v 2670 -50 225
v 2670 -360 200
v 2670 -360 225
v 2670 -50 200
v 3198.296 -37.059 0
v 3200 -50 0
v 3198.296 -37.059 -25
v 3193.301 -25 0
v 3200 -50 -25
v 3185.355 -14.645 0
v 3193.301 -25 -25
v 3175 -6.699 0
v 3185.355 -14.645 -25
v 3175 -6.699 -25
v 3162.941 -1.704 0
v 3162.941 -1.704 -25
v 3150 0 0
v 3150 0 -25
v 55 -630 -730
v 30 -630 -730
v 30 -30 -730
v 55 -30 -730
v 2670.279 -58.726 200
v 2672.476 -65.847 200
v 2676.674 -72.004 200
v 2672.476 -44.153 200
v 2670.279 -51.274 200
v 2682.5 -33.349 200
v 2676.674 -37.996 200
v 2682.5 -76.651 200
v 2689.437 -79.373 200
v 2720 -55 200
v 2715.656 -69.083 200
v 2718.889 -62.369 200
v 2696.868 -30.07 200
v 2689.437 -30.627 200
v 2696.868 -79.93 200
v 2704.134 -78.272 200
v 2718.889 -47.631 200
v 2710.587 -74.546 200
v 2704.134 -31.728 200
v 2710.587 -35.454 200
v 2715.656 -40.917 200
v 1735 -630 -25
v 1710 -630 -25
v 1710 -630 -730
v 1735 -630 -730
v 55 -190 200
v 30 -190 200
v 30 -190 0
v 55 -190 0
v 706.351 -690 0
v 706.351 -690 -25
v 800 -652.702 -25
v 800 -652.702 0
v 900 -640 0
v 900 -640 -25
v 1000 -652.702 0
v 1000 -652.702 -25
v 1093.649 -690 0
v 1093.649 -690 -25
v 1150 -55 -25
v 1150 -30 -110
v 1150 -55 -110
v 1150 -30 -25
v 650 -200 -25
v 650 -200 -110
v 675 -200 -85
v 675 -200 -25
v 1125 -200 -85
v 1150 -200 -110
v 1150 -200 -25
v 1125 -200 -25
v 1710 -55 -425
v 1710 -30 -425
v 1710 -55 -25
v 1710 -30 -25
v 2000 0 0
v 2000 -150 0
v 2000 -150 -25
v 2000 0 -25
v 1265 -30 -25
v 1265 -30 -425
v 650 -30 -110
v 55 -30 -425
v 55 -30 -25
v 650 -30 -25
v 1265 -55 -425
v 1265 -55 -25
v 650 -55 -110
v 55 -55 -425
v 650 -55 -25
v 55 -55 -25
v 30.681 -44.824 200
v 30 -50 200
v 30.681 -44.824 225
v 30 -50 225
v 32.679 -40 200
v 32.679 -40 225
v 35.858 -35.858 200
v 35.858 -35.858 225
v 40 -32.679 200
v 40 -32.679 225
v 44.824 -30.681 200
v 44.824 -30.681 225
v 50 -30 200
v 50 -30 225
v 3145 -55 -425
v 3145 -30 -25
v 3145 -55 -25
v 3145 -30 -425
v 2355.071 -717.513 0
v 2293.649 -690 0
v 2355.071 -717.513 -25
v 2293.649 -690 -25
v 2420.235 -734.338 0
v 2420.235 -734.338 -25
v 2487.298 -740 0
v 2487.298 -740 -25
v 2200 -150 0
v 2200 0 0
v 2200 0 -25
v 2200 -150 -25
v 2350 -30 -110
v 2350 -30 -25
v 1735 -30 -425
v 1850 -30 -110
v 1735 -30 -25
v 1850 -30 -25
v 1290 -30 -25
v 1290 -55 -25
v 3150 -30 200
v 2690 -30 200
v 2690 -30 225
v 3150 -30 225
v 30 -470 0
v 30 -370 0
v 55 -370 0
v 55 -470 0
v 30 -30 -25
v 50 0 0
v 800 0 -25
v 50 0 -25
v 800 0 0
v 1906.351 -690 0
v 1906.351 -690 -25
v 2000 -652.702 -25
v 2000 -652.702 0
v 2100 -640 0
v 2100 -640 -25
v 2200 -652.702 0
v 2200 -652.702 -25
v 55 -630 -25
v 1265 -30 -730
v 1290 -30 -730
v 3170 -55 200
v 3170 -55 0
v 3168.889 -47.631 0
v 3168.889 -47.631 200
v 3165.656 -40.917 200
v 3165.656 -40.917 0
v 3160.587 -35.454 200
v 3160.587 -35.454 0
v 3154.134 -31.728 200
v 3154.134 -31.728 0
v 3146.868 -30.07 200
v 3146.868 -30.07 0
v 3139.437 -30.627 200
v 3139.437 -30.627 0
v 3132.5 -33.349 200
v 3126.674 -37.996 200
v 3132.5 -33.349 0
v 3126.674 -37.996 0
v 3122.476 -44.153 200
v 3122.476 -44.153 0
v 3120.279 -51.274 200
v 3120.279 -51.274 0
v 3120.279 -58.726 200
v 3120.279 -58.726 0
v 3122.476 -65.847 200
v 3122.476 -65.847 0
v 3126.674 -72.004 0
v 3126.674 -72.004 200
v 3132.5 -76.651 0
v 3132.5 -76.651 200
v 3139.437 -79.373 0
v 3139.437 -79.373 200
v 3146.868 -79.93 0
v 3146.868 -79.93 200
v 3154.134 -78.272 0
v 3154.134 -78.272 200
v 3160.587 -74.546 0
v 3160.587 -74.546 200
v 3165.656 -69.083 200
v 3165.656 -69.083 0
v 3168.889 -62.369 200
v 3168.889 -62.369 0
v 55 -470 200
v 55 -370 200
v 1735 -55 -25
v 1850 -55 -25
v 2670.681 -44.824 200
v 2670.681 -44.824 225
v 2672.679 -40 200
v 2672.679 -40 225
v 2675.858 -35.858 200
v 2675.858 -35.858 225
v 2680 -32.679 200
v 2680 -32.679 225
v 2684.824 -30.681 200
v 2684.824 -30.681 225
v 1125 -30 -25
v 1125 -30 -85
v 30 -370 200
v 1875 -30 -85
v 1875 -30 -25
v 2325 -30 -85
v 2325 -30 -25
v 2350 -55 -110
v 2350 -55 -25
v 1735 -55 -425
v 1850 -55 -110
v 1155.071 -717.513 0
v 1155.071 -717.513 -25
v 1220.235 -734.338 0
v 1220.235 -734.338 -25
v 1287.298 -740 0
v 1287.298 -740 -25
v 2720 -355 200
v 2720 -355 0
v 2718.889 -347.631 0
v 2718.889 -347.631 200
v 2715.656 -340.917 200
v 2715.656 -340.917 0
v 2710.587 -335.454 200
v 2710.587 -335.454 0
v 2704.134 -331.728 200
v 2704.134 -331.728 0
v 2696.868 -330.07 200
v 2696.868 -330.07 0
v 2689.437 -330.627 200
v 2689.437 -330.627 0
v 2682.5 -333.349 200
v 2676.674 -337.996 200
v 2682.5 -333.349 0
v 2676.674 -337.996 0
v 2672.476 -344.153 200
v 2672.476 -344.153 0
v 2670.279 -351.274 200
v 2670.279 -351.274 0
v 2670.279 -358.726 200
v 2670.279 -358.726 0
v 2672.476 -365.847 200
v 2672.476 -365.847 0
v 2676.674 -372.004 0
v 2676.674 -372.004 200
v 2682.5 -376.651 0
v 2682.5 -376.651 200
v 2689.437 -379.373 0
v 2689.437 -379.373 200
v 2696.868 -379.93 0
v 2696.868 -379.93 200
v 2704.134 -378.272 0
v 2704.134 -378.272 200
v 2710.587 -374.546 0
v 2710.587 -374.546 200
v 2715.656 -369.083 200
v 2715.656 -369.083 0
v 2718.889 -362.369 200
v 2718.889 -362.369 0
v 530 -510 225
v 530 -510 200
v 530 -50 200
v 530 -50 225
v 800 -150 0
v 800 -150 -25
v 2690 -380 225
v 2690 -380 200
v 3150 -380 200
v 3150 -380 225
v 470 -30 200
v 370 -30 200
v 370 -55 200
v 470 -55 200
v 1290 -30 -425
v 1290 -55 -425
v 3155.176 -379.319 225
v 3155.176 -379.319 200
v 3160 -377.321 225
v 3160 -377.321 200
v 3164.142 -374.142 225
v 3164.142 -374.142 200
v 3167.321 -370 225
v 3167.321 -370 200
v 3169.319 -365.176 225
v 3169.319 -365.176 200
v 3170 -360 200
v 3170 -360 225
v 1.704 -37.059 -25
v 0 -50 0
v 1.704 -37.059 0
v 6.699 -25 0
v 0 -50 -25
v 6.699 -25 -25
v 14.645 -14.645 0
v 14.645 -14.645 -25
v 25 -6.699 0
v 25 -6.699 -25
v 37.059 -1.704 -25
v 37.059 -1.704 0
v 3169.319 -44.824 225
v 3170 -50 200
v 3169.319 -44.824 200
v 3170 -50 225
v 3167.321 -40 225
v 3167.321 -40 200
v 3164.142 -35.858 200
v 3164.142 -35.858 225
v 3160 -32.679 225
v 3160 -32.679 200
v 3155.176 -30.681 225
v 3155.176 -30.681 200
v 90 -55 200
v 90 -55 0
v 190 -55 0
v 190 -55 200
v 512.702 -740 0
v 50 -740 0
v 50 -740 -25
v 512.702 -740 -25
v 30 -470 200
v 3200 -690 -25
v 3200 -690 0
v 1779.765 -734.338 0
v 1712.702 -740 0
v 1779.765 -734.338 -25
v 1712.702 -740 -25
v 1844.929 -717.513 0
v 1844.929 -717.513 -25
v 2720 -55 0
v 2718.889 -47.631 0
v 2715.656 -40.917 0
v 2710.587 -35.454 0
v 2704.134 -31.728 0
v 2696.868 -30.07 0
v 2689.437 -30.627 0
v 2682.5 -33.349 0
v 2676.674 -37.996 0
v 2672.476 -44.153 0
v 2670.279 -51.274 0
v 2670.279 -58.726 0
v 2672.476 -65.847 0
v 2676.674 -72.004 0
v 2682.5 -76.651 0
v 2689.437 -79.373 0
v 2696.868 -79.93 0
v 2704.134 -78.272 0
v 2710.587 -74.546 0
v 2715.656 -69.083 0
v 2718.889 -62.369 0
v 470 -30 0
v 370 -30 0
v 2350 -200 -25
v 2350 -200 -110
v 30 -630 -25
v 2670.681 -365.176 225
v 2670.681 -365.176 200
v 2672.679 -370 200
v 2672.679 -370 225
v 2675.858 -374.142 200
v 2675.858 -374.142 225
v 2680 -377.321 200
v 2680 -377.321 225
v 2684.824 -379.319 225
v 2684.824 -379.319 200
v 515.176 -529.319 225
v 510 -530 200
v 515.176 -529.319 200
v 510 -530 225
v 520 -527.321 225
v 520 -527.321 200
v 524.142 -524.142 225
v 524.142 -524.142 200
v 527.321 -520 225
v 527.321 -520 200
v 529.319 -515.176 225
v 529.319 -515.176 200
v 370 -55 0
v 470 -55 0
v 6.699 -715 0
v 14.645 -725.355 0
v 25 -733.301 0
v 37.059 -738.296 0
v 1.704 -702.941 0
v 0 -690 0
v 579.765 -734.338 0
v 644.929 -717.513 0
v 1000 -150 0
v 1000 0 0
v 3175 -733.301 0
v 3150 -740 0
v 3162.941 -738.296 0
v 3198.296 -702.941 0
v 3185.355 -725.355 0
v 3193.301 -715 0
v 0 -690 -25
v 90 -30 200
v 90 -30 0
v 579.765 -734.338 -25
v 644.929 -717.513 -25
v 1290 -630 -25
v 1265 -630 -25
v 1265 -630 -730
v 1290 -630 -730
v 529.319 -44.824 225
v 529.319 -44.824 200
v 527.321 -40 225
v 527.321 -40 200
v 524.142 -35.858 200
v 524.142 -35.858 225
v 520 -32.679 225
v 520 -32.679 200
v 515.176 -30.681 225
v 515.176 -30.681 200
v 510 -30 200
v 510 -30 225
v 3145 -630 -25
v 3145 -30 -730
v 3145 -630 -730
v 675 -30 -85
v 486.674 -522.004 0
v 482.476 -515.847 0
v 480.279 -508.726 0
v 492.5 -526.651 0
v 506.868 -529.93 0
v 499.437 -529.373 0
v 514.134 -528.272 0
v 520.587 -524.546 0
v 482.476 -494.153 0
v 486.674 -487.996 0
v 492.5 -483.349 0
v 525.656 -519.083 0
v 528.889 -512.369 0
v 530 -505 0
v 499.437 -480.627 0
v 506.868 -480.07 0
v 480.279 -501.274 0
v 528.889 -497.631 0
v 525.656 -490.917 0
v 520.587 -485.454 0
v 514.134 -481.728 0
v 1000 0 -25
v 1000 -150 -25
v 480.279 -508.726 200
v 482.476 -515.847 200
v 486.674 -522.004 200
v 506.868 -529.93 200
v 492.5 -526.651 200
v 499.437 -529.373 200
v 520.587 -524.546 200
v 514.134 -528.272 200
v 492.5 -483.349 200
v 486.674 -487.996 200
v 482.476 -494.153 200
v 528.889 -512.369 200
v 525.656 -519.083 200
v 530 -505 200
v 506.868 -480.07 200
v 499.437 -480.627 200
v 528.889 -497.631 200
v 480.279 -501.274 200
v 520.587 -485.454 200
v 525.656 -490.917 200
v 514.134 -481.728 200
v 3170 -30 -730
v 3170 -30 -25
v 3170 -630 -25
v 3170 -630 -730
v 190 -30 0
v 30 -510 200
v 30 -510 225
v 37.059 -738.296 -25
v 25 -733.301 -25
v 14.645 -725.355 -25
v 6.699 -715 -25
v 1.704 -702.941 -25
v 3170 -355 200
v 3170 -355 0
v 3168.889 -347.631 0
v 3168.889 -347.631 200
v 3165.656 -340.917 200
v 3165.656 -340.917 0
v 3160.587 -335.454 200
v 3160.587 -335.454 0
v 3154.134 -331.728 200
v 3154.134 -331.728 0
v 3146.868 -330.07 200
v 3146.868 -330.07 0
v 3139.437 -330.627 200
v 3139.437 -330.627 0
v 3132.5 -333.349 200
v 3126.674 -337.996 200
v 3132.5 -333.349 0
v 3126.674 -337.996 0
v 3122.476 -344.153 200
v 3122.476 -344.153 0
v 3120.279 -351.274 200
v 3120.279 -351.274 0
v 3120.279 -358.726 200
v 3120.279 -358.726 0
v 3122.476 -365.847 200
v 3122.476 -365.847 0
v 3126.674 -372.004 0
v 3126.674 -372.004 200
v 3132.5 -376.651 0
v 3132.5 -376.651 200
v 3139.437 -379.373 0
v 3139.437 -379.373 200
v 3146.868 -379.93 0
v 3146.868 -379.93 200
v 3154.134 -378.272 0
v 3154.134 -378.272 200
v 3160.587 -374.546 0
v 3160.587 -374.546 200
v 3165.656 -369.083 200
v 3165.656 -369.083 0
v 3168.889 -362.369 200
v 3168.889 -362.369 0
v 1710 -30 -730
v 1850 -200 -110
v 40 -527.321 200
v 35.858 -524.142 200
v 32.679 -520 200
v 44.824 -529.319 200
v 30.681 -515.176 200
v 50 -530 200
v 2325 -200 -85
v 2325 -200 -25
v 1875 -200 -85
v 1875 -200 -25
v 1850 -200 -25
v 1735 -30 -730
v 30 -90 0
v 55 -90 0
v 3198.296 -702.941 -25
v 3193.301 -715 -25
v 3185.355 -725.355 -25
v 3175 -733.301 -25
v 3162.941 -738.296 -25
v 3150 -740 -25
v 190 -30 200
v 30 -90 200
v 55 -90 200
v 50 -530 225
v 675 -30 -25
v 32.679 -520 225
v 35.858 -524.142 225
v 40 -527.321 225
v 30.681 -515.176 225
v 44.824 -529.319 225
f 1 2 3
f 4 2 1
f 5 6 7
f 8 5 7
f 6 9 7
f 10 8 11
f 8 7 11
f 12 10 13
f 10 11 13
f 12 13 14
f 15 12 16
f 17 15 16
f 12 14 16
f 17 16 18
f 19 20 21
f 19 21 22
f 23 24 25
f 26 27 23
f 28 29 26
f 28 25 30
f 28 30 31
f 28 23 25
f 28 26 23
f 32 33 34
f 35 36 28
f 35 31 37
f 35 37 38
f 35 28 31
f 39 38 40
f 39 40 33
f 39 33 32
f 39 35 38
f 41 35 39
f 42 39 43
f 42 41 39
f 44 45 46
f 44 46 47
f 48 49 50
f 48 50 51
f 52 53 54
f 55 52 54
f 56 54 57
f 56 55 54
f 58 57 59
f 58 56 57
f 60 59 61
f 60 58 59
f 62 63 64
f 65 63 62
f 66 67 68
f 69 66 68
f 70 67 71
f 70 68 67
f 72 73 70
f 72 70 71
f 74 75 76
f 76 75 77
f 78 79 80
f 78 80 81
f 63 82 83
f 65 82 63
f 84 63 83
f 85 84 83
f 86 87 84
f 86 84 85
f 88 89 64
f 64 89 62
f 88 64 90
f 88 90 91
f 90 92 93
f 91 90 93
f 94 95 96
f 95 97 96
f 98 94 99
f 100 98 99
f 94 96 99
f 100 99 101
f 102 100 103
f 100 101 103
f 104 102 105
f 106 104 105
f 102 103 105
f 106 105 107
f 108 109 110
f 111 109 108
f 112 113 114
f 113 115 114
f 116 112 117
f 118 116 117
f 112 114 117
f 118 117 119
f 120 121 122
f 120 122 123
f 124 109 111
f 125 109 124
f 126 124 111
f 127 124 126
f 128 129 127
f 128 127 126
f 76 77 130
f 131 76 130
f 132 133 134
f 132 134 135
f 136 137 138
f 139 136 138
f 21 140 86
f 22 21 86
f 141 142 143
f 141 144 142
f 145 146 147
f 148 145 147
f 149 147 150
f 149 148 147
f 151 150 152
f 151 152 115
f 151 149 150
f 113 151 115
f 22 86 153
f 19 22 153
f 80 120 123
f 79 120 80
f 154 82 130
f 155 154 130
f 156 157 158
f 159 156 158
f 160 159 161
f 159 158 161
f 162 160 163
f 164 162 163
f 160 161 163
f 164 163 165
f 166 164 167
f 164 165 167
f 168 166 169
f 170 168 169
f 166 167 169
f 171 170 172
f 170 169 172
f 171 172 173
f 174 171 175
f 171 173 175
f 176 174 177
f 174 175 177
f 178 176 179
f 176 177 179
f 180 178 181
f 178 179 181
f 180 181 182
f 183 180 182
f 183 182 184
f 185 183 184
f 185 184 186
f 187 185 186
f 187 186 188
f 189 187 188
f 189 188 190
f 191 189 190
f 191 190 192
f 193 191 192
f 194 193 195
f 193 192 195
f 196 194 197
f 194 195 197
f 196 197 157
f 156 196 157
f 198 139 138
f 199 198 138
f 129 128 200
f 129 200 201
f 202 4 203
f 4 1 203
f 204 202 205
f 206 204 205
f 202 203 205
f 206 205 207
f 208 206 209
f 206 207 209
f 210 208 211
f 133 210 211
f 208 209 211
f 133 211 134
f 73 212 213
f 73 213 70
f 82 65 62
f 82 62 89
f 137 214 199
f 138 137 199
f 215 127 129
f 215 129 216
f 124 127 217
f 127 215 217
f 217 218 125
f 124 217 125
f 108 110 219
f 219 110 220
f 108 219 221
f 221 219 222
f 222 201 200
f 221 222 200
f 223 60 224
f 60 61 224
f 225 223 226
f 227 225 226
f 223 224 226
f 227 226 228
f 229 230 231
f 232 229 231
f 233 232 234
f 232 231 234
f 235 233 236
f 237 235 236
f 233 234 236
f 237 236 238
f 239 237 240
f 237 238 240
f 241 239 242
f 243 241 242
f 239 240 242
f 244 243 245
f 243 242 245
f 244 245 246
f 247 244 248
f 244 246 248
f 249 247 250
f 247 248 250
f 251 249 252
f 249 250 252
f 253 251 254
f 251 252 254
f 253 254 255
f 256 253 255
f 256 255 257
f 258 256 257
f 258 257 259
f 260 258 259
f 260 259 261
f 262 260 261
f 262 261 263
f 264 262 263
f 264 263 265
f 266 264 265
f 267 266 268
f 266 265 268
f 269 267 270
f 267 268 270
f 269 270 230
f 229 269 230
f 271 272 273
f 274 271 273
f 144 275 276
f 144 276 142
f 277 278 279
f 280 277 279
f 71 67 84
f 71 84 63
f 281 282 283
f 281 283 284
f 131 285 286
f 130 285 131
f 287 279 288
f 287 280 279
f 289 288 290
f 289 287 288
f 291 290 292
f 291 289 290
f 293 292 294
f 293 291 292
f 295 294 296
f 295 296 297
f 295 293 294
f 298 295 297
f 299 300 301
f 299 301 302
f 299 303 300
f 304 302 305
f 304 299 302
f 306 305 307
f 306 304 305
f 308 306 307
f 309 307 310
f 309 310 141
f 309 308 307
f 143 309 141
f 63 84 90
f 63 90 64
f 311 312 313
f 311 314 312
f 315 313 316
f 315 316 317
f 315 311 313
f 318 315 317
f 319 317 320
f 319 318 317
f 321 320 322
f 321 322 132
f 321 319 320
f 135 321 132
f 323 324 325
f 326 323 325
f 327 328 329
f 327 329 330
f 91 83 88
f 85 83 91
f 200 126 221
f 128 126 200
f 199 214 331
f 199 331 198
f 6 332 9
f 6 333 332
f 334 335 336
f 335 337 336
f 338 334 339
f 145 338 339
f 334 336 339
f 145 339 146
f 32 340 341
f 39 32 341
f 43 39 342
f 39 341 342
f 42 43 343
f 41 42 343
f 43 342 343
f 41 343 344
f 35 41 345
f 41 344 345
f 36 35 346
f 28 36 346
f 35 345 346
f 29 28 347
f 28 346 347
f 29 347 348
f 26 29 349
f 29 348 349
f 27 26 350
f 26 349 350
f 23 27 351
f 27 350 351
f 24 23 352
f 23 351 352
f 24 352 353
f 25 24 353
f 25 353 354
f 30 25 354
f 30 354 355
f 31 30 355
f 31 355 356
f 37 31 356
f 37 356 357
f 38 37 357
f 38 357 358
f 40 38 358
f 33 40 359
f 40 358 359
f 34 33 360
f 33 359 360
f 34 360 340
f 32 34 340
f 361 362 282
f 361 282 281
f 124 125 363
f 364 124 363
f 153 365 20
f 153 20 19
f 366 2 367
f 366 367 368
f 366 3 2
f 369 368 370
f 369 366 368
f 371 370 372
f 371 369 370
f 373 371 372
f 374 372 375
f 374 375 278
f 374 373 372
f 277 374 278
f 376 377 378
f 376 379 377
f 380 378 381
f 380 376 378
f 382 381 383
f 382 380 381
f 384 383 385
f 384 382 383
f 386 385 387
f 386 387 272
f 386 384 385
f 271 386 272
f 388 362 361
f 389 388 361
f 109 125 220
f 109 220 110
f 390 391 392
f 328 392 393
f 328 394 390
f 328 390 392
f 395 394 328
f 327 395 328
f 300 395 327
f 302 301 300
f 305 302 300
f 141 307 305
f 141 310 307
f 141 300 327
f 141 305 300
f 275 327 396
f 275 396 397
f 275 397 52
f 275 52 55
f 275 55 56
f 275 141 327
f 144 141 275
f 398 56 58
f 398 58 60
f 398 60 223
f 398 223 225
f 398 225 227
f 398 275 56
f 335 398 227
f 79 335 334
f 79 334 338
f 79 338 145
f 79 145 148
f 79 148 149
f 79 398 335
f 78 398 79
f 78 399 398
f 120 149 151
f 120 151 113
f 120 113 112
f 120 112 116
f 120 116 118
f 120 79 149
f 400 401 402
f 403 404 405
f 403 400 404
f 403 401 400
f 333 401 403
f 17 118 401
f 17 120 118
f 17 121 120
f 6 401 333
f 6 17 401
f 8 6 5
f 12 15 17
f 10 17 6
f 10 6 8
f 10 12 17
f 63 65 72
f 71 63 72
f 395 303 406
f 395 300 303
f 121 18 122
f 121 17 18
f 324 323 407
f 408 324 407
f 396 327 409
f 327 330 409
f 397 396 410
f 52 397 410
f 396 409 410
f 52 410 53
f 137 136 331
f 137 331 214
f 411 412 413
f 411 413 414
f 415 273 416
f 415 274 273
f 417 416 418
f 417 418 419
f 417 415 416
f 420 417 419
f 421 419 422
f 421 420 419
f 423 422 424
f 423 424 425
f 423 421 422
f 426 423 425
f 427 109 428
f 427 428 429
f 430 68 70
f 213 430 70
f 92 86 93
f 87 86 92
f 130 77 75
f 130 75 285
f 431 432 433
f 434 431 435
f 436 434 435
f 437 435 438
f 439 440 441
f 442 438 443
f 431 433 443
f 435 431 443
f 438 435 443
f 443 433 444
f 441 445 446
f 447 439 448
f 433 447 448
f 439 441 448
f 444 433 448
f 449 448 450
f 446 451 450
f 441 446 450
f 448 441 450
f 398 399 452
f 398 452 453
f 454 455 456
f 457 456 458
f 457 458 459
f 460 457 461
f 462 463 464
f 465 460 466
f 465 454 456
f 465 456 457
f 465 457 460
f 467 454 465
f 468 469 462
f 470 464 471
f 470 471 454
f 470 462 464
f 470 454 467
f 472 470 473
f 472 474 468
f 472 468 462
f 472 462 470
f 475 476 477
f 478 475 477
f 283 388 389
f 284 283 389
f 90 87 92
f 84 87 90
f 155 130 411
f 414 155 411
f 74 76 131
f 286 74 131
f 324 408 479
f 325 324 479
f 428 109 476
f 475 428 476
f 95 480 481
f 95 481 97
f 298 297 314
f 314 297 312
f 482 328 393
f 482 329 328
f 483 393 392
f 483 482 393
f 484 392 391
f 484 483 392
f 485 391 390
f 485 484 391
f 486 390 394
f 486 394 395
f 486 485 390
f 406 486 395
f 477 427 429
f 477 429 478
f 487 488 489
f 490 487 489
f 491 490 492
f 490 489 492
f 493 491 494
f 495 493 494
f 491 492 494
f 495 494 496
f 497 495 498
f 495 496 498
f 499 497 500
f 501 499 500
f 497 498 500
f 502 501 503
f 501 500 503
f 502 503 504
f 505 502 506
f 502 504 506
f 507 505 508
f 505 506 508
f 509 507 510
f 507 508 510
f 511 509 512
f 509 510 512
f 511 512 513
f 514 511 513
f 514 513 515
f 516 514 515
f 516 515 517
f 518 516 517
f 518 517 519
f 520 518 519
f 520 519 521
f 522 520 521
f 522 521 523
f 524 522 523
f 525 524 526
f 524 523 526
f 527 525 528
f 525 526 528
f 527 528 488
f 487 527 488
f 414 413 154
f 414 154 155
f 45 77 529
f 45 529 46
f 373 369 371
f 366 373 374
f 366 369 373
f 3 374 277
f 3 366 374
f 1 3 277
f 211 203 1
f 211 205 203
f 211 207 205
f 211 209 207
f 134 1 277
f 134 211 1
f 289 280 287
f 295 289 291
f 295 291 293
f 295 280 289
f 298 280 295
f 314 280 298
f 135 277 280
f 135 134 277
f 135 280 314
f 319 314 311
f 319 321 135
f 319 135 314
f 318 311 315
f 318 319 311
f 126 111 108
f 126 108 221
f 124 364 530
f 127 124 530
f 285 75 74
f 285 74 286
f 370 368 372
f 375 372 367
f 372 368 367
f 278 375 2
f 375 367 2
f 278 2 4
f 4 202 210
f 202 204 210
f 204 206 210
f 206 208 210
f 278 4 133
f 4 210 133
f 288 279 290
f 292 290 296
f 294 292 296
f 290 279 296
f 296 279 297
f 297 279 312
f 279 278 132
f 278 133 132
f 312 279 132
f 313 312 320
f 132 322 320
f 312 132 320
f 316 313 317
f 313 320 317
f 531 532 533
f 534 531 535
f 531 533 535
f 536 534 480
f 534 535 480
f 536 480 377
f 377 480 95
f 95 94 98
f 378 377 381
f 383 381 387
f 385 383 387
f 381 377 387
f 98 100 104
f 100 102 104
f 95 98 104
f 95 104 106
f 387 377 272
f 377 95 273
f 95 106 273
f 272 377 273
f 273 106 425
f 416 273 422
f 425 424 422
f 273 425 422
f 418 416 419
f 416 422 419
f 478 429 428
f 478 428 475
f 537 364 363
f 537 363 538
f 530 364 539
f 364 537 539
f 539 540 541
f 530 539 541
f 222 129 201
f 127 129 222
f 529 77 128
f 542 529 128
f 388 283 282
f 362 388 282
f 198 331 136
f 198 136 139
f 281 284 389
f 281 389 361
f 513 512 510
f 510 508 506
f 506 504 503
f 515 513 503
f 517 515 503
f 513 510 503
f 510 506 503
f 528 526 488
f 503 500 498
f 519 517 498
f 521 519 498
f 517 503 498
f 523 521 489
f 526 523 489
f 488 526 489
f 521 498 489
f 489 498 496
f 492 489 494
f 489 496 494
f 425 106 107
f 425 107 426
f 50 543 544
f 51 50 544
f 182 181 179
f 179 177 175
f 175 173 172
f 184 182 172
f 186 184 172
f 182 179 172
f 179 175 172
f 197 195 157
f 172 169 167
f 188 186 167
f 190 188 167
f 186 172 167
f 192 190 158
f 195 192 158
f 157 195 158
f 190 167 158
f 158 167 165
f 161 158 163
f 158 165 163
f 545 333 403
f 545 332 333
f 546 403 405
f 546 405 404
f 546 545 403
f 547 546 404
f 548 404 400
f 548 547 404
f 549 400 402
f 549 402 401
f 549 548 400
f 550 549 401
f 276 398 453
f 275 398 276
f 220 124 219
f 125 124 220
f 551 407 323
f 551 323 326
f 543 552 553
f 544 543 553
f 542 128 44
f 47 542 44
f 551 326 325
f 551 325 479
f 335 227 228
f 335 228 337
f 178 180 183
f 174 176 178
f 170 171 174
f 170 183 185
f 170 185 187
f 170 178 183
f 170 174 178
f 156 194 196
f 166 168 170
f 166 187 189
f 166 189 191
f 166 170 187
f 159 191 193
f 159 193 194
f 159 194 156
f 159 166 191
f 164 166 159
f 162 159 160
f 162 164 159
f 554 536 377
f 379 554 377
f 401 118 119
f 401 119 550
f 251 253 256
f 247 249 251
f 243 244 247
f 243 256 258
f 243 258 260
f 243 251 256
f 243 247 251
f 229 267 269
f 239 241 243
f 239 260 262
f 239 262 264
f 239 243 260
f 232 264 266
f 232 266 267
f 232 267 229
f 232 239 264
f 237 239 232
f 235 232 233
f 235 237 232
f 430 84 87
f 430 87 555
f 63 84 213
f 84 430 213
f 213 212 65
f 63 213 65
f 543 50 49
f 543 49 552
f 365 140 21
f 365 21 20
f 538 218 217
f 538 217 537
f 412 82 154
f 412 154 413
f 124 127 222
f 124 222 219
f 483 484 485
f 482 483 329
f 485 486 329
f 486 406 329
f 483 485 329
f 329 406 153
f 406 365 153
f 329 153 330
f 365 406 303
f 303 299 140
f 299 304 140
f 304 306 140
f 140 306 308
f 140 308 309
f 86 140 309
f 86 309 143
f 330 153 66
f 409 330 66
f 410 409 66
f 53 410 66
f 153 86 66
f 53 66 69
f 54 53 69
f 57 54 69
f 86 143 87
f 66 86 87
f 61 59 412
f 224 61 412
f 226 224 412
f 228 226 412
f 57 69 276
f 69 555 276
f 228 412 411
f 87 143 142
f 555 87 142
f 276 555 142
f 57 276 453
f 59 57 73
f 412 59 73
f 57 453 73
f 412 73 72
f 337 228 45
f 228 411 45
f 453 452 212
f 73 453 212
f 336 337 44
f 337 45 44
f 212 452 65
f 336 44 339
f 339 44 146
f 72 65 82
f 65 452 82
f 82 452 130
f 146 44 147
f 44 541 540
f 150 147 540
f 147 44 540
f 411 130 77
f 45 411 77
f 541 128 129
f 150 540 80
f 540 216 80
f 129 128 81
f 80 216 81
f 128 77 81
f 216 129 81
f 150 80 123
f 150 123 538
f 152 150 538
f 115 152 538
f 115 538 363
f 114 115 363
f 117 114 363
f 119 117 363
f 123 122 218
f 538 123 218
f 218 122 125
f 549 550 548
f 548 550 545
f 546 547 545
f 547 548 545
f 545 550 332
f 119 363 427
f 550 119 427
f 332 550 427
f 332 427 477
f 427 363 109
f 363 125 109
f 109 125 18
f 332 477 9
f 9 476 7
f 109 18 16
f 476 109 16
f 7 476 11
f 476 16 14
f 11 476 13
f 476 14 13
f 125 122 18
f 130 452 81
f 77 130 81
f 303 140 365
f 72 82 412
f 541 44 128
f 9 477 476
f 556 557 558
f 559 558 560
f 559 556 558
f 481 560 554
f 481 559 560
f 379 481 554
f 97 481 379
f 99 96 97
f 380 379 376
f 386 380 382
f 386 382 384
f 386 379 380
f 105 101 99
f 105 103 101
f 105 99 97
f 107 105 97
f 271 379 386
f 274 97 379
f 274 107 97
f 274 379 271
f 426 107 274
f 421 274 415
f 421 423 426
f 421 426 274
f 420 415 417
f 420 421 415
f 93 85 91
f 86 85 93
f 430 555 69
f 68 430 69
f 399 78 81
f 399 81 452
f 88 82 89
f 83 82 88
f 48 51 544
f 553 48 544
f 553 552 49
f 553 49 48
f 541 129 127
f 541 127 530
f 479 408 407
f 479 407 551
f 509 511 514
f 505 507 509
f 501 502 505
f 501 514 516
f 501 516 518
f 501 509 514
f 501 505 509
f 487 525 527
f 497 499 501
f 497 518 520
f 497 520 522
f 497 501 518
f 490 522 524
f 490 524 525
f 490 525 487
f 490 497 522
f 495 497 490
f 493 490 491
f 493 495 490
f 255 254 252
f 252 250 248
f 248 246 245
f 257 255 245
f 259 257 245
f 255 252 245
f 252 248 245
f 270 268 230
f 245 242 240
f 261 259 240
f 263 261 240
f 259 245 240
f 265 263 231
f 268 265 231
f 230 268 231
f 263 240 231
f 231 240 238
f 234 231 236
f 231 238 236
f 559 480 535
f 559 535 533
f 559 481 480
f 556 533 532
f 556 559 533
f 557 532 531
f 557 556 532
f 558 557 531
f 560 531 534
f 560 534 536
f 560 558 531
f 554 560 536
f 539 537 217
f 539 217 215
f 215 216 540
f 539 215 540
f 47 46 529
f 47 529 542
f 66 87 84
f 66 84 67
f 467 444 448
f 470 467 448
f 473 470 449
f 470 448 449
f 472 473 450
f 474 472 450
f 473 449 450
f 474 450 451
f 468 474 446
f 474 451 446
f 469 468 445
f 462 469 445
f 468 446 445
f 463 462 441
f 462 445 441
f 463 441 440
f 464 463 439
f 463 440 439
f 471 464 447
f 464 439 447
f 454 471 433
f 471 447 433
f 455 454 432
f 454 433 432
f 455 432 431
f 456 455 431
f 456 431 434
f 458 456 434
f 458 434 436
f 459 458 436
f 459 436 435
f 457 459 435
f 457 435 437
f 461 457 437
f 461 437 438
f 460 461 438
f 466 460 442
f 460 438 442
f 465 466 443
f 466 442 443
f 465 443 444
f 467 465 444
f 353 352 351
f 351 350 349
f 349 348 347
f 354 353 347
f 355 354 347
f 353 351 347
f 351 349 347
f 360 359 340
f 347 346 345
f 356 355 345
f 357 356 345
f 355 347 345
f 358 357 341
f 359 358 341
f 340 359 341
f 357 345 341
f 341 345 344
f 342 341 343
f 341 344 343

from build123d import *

# Parameters (mm, degrees)
F2_DEPTH  = 25
F3_R      = 400
F6_W      = 25
F6_H      = 630
F7_DEPTH  = 705
F8_W      = 25
F8_H      = 200
F9_DEPTH  = 60
F10_W     = 500
F10_H     = 200
F11_DEPTH = 25
F12_W     = 3200
F12_H     = 30
F13_DEPTH = 705.001
F14_R     = 50
F15_W     = 100
F15_H     = 25
F16_DEPTH = 200
F15_W_2   = 25
F15_H_2   = 100
F15_R     = 25
F17_W     = 500
F17_H     = 500
F18_DEPTH = 25
F19_R     = 20
F21_DEPTH = 25
F20_W     = 420
F20_H     = 400
F22_R     = 25
F23_DEPTH = 200
F24_W     = 500
F24_H     = 350
F25_DEPTH = 25
F26_R     = 20


# Not quite as in the source:
# - a pattern or mirror of a feature is missing from the dataset's text; its kind, count and spacing are read off the source's solid


with BuildPart() as f2:
    # F1 (on Top) → F2 (new body)
    with BuildSketch(Plane.XY):
        with BuildLine():
            Line((800, 0), (0, 0))
            Line((0, 0), (0, -740))
            Line((0, -740), (635.4248688935, -740))
            ThreePointArc((635.4248688935, -740), (900, -640), (1164.5751311065, -740))
            Line((1164.5751311065, -740), (1835.4248688935, -740))
            ThreePointArc((1835.4248688935, -740), (2100, -640), (2364.5751311065, -740))
            Line((2364.5751311065, -740), (3200, -740))
            Line((3200, -740), (3200, 0))
            Line((3200, 0), (2200, 0))
            Line((2200, 0), (2200, -150))
            Line((2200, -150), (2000, -150))
            Line((2000, -150), (2000, 0))
            Line((2000, 0), (1000, 0))
            Line((1000, 0), (1000, -150))
            Line((1000, -150), (800, -150))
            Line((800, -150), (800, 0))
        make_face()
    extrude(amount=-F2_DEPTH)

    # F3
    f3_edges = [f2.edges().sort_by_distance(p)[0] for p in [
        (635.424869, -740, -12.5),
        (1164.575131, -740, -12.5),
        (1835.424869, -740, -12.5),
        (2364.575131, -740, -12.5),
    ]]
    fillet(f3_edges, radius=F3_R)

    # F6 (on face) → F7 (join)
    with BuildSketch(Plane(origin=(0, 0, -25), x_dir=(1, 0, 0), z_dir=(0, 0, -1))):
        with Locations((1277.5, 315)):
            Rectangle(F6_W, F6_H)
        with Locations((1722.5, 315)):
            Rectangle(F6_W, F6_H)
        with Locations((42.5, 315)):
            Rectangle(F6_W, F6_H)
        with Locations((3157.5, 315)):
            Rectangle(F6_W, F6_H)
    extrude(amount=F7_DEPTH)

    # F8 (on face) → F9 (join)
    with BuildSketch(Plane(origin=(0, 0, -25), x_dir=(1, 0, 0), z_dir=(0, 0, -1))):
        with Locations((662.5, 100)):
            Rectangle(F8_W, F8_H)
        with Locations((1137.5, 100)):
            Rectangle(F8_W, F8_H)
    f9 = extrude(amount=F9_DEPTH)

    # F9_copies: F9 across plane
    add(f9.mirror(Plane(origin=(1500, 0, 0), x_dir=(0, 0, 1), z_dir=(1, 0, 0))))

    # F10 (on face) → F11 (join)
    with BuildSketch(Plane(origin=(0, 0, -85), x_dir=(1, 0, 0), z_dir=(0, 0, -1))):
        with Locations((900, 100)):
            Rectangle(F10_W, F10_H)
    f11 = extrude(amount=F11_DEPTH)

    # F11_copies: F11 across plane
    add(f11.mirror(Plane(origin=(1500, 0, 0), x_dir=(0, 0, 1), z_dir=(1, 0, 0))))

    # F12 (on face) → F13 (cut, through all)
    with BuildSketch(Plane(origin=(0, 0, -25), x_dir=(1, 0, 0), z_dir=(0, 0, -1))):
        with Locations((1600, 15)):
            Rectangle(F12_W, F12_H)
    extrude(amount=F13_DEPTH, mode=Mode.SUBTRACT)

    # F14
    f14_edges = [f2.edges().sort_by_distance(p)[0] for p in [
        (3200, -740, -12.5),
        (3200, 0, -12.5),
        (0, 0, -12.5),
        (0, -740, -12.5),
    ]]
    fillet(f14_edges, radius=F14_R)


with BuildPart() as f16:
    # F15 (on face) → F16 (new body)
    with BuildSketch(Plane.XY):
        with Locations((140, -42.5)):
            Rectangle(F15_W, F15_H)
    extrude(amount=F16_DEPTH)


with BuildPart() as f16b:
    # F15 (on face) → F16, piece 2 (new body)
    with BuildSketch(Plane.XY):
        with Locations((42.5, -140)):
            Rectangle(F15_W_2, F15_H_2)
    extrude(amount=F16_DEPTH)


with BuildPart() as f16c:
    # F15 (on face) → F16, piece 3 (new body)
    with BuildSketch(Plane.XY):
        with Locations((420, -42.5)):
            Rectangle(F15_W, F15_H)
    extrude(amount=F16_DEPTH)


with BuildPart() as f16d:
    # F15 (on face) → F16, piece 4 (new body)
    with BuildSketch(Plane.XY):
        with Locations((42.5, -420)):
            Rectangle(F15_W_2, F15_H_2)
    extrude(amount=F16_DEPTH)


with BuildPart() as f16e:
    # F15 (on face) → F16, piece 5 (new body)
    with BuildSketch(Plane.XY):
        with Locations((505, -505)):
            Circle(F15_R)
    extrude(amount=F16_DEPTH)


with BuildPart() as f18:
    # F17 (on face) → F18 (new body)
    with BuildSketch(Plane.XY.offset(200)):
        with Locations((280, -280)):
            Rectangle(F17_W, F17_H)
    extrude(amount=F18_DEPTH)

    # F19
    f19_edges = [f18.edges().sort_by_distance(p)[0] for p in [
        (530, -530, 212.5),
        (530, -30, 212.5),
        (30, -530, 212.5),
        (30, -30, 212.5),
    ]]
    fillet(f19_edges, radius=F19_R)


with BuildPart() as f21:
    # F20 (on face) → F21 (new body)
    with BuildSketch(Plane(origin=(0, -30, 0), x_dir=(-1, 0, 0), z_dir=(0, 1, 0))):
        Polygon((-1265, -425), (-55, -425), (-55, -25), (-650, -25), (-650, -110), (-1150, -110), (-1150, -25), (-1265, -25), align=None)
    extrude(amount=-F21_DEPTH)


with BuildPart() as f21b:
    # F20 (on face) → F21, piece 2 (new body)
    with BuildSketch(Plane(origin=(0, -30, 0), x_dir=(-1, 0, 0), z_dir=(0, 1, 0))):
        with Locations((-1500, -225)):
            Rectangle(F20_W, F20_H)
    extrude(amount=-F21_DEPTH)


with BuildPart() as f21c:
    # F20 (on face) → F21, piece 3 (new body)
    with BuildSketch(Plane(origin=(0, -30, 0), x_dir=(-1, 0, 0), z_dir=(0, 1, 0))):
        Polygon((-2350, -25), (-3145, -25), (-3145, -425), (-1735, -425), (-1735, -25), (-1850, -25), (-1850, -110), (-2350, -110), align=None)
    extrude(amount=-F21_DEPTH)


with BuildPart() as f23:
    # F22 (on face) → F23 (new body)
    with BuildSketch(Plane.XY):
        with Locations((2695, -55)):
            Circle(F22_R)
    extrude(amount=F23_DEPTH)


with BuildPart() as f23b:
    # F22 (on face) → F23, piece 2 (new body)
    with BuildSketch(Plane.XY):
        with Locations((3145, -55)):
            Circle(F22_R)
    extrude(amount=F23_DEPTH)


with BuildPart() as f23c:
    # F22 (on face) → F23, piece 3 (new body)
    with BuildSketch(Plane.XY):
        with Locations((3145, -355)):
            Circle(F22_R)
    extrude(amount=F23_DEPTH)


with BuildPart() as f23d:
    # F22 (on face) → F23, piece 4 (new body)
    with BuildSketch(Plane.XY):
        with Locations((2695, -355)):
            Circle(F22_R)
    extrude(amount=F23_DEPTH)


with BuildPart() as f25:
    # F24 (on face) → F25 (new body)
    with BuildSketch(Plane.XY.offset(200)):
        with Locations((2920, -205)):
            Rectangle(F24_W, F24_H)
    extrude(amount=F25_DEPTH)

    # F26
    f26_edges = [f25.edges().sort_by_distance(p)[0] for p in [
        (2670, -380, 212.5),
        (3170, -380, 212.5),
        (2670, -30, 212.5),
        (3170, -30, 212.5),
    ]]
    fillet(f26_edges, radius=F26_R)


solid = Compound([f2.part, f16.part, f16b.part, f16c.part, f16d.part, f16e.part, f18.part, f21.part, f21b.part, f21c.part, f23.part, f23b.part, f23c.part, f23d.part, f25.part])
